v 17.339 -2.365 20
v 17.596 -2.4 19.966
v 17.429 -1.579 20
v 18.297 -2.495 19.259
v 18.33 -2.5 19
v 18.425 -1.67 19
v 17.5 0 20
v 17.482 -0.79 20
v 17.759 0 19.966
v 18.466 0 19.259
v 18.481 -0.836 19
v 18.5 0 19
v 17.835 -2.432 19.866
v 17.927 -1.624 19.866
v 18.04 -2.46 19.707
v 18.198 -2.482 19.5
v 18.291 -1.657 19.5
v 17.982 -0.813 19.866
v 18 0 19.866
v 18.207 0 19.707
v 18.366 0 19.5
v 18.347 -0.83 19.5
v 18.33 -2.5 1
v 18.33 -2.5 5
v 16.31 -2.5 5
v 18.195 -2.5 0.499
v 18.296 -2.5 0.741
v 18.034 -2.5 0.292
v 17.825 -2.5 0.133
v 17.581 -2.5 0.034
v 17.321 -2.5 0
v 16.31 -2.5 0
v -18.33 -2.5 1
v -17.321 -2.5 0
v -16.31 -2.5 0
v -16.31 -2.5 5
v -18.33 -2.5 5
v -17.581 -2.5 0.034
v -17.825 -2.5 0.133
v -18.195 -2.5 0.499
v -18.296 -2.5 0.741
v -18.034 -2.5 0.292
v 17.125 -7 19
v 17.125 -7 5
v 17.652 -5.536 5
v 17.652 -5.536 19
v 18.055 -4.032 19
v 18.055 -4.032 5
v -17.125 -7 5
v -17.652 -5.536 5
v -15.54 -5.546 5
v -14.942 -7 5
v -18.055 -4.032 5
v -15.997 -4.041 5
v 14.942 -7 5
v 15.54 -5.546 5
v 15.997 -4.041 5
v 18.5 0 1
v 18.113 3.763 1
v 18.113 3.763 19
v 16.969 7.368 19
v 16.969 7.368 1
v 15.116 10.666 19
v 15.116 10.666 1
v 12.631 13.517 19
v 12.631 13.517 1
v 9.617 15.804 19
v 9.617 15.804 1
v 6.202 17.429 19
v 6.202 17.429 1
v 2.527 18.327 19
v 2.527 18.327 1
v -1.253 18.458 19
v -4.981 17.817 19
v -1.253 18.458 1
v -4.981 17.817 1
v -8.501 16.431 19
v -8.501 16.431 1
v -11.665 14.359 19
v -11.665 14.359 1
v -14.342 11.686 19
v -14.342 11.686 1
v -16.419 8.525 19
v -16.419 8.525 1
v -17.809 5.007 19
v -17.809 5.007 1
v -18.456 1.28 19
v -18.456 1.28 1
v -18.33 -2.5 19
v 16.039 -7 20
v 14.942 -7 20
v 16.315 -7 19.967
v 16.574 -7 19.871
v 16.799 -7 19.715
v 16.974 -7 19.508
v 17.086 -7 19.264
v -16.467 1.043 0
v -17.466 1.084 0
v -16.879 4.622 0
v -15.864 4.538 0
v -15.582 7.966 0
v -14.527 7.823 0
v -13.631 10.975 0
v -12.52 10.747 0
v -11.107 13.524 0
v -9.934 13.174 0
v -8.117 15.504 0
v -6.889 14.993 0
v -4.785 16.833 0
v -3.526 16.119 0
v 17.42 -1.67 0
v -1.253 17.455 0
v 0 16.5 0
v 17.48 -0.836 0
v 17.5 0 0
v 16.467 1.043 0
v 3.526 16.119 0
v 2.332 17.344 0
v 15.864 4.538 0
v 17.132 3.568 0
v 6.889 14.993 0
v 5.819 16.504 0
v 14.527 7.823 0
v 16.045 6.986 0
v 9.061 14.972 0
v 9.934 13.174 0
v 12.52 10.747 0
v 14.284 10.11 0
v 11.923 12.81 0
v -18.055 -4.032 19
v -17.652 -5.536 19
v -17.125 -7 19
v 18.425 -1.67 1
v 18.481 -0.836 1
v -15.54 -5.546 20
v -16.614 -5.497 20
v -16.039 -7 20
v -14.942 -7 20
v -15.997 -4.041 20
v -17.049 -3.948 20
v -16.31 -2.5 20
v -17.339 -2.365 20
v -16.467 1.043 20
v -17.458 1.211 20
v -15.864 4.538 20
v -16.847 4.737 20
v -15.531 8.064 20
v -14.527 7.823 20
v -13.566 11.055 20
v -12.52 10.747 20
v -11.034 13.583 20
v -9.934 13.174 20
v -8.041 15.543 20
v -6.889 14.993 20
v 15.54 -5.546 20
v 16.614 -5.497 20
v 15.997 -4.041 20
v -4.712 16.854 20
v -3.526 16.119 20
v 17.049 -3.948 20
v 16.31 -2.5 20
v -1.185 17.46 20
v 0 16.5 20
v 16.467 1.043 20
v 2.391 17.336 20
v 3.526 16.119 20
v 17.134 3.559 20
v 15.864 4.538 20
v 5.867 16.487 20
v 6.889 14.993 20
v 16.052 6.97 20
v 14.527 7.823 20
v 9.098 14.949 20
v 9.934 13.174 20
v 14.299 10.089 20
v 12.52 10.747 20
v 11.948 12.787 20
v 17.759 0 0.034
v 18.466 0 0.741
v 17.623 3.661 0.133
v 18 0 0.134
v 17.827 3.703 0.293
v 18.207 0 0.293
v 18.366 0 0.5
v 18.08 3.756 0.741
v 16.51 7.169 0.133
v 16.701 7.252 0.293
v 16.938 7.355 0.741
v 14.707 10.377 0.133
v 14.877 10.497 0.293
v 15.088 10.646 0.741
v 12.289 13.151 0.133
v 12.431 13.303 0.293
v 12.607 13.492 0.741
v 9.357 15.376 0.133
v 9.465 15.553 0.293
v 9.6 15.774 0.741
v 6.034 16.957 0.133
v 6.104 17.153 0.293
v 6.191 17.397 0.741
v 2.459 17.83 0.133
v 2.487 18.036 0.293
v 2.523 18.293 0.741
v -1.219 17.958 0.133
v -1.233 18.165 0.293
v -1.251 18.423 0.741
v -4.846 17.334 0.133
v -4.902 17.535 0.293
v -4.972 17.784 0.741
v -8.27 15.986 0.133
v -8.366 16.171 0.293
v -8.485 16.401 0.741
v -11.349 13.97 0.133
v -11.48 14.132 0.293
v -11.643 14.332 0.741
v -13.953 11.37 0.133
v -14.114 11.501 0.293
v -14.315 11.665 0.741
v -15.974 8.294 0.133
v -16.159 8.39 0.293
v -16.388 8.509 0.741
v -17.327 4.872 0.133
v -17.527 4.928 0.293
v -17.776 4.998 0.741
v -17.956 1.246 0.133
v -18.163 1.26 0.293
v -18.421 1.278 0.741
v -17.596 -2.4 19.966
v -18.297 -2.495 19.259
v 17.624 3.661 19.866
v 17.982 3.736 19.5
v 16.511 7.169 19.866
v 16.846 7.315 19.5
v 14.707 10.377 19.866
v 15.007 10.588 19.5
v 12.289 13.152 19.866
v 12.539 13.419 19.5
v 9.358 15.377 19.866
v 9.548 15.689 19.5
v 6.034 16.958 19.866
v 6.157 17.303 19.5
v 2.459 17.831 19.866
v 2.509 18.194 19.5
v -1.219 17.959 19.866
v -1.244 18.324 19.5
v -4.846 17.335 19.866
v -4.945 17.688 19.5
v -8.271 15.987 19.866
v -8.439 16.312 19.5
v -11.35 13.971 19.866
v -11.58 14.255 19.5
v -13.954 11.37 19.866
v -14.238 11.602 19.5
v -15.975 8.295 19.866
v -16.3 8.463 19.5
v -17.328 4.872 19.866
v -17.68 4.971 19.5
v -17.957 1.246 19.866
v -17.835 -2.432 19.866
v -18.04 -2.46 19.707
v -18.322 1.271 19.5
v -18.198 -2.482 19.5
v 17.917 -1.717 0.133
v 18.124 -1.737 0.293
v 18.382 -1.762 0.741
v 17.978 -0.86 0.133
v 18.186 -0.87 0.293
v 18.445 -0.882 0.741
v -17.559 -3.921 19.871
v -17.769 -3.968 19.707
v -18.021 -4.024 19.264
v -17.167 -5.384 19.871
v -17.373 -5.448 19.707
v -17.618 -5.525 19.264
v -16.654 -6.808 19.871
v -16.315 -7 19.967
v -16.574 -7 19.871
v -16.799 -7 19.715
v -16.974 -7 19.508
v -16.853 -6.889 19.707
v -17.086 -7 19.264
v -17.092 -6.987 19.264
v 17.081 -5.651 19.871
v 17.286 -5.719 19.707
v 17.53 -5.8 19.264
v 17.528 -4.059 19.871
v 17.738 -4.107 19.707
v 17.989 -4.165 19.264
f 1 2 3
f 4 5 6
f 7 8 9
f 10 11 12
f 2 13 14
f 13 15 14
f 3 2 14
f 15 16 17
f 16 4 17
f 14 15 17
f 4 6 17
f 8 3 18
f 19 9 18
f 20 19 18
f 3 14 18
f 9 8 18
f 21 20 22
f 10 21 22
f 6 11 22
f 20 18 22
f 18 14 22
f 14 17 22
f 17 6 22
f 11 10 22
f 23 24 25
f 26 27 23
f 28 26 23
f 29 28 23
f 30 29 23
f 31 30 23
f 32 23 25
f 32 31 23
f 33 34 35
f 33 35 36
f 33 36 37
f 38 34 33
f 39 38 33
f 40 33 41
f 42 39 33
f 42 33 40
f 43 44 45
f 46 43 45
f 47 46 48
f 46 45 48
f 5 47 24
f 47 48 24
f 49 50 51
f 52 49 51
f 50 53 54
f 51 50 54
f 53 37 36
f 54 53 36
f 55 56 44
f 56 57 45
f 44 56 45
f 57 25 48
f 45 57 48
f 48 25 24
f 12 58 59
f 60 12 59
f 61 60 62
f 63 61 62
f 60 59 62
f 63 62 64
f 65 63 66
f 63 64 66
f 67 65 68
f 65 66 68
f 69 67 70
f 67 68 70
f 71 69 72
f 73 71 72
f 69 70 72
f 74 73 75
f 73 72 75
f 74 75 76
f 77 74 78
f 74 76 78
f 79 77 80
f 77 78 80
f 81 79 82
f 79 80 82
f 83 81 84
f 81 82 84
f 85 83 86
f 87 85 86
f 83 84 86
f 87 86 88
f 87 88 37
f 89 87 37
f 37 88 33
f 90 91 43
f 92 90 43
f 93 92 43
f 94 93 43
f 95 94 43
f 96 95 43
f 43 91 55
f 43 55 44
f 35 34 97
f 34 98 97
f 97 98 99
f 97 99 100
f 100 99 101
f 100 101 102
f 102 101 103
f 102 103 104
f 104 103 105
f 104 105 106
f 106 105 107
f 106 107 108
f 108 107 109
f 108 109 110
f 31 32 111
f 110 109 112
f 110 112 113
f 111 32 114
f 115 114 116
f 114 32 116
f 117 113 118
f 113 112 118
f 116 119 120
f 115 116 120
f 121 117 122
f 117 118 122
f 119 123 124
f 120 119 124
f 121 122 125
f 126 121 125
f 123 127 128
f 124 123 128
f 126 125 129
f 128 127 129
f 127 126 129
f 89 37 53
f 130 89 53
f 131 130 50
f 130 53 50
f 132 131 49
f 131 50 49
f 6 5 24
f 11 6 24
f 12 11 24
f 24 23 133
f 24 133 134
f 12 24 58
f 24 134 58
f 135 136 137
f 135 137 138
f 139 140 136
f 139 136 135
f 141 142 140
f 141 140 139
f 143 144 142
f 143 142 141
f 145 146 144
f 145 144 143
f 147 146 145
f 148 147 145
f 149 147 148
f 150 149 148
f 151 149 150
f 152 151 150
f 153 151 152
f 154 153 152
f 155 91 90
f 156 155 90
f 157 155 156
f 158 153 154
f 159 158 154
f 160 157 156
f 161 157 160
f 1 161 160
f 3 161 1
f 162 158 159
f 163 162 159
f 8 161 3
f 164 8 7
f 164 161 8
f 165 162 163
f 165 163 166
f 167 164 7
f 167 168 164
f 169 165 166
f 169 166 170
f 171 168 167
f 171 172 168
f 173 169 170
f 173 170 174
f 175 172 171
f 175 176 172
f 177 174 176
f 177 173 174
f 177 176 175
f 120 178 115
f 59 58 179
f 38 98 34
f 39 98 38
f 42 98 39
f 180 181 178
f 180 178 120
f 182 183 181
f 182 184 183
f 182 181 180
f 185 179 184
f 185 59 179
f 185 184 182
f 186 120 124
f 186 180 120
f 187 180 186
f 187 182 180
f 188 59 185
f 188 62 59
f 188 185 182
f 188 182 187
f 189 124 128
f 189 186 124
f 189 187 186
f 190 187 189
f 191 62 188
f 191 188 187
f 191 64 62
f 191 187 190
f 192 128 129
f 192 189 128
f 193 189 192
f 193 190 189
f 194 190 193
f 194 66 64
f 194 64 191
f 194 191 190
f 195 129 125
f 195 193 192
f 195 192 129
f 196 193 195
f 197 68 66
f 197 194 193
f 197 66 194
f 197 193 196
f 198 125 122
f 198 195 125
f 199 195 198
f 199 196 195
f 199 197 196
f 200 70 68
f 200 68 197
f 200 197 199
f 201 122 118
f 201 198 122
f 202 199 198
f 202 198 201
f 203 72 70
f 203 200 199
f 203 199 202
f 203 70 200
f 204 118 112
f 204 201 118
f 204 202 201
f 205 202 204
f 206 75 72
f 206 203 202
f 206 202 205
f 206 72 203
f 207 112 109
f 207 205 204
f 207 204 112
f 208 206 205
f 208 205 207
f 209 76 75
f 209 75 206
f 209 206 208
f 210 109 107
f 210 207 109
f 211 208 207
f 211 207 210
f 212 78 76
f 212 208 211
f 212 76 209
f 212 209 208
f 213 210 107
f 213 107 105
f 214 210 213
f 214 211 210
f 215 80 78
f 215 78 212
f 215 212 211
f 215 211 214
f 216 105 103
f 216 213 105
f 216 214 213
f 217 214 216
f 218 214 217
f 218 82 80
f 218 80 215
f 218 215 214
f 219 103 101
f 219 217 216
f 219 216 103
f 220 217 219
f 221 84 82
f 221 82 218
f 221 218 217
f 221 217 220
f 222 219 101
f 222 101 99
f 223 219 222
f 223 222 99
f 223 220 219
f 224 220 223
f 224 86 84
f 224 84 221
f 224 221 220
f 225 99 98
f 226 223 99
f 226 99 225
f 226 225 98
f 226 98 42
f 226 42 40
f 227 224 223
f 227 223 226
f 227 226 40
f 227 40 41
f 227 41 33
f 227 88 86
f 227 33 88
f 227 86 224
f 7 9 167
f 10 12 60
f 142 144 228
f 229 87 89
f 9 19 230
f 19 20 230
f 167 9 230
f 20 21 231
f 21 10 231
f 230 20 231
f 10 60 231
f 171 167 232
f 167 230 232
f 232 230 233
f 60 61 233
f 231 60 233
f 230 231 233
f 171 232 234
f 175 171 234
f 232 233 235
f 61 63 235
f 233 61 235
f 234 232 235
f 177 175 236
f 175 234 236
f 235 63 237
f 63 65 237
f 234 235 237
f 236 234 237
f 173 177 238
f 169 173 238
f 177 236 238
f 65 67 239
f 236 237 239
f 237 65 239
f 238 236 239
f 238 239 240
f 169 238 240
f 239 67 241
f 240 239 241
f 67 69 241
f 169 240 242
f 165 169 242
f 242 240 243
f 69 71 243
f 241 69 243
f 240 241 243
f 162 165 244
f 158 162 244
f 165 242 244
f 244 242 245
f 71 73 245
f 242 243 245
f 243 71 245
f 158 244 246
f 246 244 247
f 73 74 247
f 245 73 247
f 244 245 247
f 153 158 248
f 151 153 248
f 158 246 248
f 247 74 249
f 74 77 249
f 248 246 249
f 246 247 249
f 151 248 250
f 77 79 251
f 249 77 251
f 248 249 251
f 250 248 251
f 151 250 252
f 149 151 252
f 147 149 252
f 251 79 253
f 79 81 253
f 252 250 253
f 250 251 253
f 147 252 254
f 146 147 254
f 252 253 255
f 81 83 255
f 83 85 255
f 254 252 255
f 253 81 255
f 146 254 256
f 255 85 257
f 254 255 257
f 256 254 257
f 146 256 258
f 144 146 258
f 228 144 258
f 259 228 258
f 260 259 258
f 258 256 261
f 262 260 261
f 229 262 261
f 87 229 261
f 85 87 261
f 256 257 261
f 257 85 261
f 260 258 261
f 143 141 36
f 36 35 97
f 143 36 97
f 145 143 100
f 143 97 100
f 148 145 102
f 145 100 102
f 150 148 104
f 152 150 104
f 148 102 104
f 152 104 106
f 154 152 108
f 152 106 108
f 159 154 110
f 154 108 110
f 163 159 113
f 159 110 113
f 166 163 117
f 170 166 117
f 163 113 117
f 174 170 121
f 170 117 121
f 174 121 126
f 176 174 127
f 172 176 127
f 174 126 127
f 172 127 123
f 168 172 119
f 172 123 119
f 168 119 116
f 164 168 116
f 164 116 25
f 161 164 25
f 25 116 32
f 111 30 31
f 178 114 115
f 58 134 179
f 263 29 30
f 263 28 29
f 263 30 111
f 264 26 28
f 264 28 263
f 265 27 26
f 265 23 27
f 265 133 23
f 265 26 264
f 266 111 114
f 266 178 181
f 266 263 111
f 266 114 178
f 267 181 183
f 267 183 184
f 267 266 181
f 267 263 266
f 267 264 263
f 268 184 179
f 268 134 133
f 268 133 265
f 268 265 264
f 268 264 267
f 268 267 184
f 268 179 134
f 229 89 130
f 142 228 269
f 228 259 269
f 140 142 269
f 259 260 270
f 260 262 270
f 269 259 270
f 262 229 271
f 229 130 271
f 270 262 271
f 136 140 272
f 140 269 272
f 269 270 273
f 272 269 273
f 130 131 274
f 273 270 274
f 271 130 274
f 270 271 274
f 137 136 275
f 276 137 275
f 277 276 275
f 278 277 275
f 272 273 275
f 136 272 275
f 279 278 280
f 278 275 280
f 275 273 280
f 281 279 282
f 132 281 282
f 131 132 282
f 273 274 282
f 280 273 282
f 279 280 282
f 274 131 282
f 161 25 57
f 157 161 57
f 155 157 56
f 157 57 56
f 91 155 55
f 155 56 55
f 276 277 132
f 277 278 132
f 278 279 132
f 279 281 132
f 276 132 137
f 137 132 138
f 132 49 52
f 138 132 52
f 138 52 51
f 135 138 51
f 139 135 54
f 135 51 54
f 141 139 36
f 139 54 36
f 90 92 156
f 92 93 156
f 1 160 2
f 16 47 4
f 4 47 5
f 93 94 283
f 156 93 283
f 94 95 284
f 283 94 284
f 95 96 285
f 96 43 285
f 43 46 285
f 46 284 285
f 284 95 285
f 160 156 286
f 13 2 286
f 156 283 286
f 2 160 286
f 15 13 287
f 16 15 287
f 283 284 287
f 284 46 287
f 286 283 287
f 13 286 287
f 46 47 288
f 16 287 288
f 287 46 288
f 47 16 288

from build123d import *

# Parameters (mm, degrees)
F1_DEPTH = 20
F2_DEPTH = 5
F3_R     = 1


with BuildPart() as f1:
    # F0 (on Top) → F1 (new body)
    with BuildSketch(Plane.XY):
        with BuildLine():
            ThreePointArc((-16.3095064303, -2.5), (-1.253623528, 16.4523076816), (16.5, 0))
            ThreePointArc((16.5, 0), (16.4523076816, -1.253623528), (16.3095064303, -2.5))
            Line((16.3095064303, -2.5), (18.3303027798, -2.5))
            ThreePointArc((18.3303027798, -2.5), (18.4575269393, -1.2528764052), (18.5, 0))
            ThreePointArc((18.5, 0), (-1.2528764052, 18.4575269393), (-18.3303027798, -2.5))
            Line((-18.3303027798, -2.5), (-16.3095064303, -2.5))
        make_face()
        with BuildLine():
            Line((18.3303027798, -2.5), (16.3095064303, -2.5))
            ThreePointArc((16.3095064303, -2.5), (15.7866929949, -4.7989920072), (14.9415527975, -7))
            Line((14.9415527975, -7), (17.1245437895, -7))
            ThreePointArc((17.1245437895, -7), (17.8696400723, -4.7881064823), (18.3303027798, -2.5))
        make_face()
        with BuildLine():
            ThreePointArc((-14.9415527975, -7), (-15.7866929949, -4.7989920072), (-16.3095064303, -2.5))
            Line((-16.3095064303, -2.5), (-18.3303027798, -2.5))
            ThreePointArc((-18.3303027798, -2.5), (-17.8696400723, -4.7881064823), (-17.1245437895, -7))
            Line((-17.1245437895, -7), (-14.9415527975, -7))
        make_face()
    extrude(amount=F1_DEPTH)

    # F0 (on Top) → F2 (cut)
    with BuildSketch(Plane.XY):
        with BuildLine():
            ThreePointArc((-14.9415527975, -7), (-15.7866929949, -4.7989920072), (-16.3095064303, -2.5))
            Line((-16.3095064303, -2.5), (-18.3303027798, -2.5))
            ThreePointArc((-18.3303027798, -2.5), (-17.8696400723, -4.7881064823), (-17.1245437895, -7))
            Line((-17.1245437895, -7), (-14.9415527975, -7))
        make_face()
        with BuildLine():
            Line((18.3303027798, -2.5), (16.3095064303, -2.5))
            ThreePointArc((16.3095064303, -2.5), (15.7866929949, -4.7989920072), (14.9415527975, -7))
            Line((14.9415527975, -7), (17.1245437895, -7))
            ThreePointArc((17.1245437895, -7), (17.8696400723, -4.7881064823), (18.3303027798, -2.5))
        make_face()
    extrude(amount=F2_DEPTH, mode=Mode.SUBTRACT)

    # F3
    f3_edges = [f1.edges().sort_by_distance(p)[0] for p in [
        (0, 18.5, 20),
        (0, 18.5, 0),
    ]]
    fillet(f3_edges, radius=F3_R)


solid = f1.part
